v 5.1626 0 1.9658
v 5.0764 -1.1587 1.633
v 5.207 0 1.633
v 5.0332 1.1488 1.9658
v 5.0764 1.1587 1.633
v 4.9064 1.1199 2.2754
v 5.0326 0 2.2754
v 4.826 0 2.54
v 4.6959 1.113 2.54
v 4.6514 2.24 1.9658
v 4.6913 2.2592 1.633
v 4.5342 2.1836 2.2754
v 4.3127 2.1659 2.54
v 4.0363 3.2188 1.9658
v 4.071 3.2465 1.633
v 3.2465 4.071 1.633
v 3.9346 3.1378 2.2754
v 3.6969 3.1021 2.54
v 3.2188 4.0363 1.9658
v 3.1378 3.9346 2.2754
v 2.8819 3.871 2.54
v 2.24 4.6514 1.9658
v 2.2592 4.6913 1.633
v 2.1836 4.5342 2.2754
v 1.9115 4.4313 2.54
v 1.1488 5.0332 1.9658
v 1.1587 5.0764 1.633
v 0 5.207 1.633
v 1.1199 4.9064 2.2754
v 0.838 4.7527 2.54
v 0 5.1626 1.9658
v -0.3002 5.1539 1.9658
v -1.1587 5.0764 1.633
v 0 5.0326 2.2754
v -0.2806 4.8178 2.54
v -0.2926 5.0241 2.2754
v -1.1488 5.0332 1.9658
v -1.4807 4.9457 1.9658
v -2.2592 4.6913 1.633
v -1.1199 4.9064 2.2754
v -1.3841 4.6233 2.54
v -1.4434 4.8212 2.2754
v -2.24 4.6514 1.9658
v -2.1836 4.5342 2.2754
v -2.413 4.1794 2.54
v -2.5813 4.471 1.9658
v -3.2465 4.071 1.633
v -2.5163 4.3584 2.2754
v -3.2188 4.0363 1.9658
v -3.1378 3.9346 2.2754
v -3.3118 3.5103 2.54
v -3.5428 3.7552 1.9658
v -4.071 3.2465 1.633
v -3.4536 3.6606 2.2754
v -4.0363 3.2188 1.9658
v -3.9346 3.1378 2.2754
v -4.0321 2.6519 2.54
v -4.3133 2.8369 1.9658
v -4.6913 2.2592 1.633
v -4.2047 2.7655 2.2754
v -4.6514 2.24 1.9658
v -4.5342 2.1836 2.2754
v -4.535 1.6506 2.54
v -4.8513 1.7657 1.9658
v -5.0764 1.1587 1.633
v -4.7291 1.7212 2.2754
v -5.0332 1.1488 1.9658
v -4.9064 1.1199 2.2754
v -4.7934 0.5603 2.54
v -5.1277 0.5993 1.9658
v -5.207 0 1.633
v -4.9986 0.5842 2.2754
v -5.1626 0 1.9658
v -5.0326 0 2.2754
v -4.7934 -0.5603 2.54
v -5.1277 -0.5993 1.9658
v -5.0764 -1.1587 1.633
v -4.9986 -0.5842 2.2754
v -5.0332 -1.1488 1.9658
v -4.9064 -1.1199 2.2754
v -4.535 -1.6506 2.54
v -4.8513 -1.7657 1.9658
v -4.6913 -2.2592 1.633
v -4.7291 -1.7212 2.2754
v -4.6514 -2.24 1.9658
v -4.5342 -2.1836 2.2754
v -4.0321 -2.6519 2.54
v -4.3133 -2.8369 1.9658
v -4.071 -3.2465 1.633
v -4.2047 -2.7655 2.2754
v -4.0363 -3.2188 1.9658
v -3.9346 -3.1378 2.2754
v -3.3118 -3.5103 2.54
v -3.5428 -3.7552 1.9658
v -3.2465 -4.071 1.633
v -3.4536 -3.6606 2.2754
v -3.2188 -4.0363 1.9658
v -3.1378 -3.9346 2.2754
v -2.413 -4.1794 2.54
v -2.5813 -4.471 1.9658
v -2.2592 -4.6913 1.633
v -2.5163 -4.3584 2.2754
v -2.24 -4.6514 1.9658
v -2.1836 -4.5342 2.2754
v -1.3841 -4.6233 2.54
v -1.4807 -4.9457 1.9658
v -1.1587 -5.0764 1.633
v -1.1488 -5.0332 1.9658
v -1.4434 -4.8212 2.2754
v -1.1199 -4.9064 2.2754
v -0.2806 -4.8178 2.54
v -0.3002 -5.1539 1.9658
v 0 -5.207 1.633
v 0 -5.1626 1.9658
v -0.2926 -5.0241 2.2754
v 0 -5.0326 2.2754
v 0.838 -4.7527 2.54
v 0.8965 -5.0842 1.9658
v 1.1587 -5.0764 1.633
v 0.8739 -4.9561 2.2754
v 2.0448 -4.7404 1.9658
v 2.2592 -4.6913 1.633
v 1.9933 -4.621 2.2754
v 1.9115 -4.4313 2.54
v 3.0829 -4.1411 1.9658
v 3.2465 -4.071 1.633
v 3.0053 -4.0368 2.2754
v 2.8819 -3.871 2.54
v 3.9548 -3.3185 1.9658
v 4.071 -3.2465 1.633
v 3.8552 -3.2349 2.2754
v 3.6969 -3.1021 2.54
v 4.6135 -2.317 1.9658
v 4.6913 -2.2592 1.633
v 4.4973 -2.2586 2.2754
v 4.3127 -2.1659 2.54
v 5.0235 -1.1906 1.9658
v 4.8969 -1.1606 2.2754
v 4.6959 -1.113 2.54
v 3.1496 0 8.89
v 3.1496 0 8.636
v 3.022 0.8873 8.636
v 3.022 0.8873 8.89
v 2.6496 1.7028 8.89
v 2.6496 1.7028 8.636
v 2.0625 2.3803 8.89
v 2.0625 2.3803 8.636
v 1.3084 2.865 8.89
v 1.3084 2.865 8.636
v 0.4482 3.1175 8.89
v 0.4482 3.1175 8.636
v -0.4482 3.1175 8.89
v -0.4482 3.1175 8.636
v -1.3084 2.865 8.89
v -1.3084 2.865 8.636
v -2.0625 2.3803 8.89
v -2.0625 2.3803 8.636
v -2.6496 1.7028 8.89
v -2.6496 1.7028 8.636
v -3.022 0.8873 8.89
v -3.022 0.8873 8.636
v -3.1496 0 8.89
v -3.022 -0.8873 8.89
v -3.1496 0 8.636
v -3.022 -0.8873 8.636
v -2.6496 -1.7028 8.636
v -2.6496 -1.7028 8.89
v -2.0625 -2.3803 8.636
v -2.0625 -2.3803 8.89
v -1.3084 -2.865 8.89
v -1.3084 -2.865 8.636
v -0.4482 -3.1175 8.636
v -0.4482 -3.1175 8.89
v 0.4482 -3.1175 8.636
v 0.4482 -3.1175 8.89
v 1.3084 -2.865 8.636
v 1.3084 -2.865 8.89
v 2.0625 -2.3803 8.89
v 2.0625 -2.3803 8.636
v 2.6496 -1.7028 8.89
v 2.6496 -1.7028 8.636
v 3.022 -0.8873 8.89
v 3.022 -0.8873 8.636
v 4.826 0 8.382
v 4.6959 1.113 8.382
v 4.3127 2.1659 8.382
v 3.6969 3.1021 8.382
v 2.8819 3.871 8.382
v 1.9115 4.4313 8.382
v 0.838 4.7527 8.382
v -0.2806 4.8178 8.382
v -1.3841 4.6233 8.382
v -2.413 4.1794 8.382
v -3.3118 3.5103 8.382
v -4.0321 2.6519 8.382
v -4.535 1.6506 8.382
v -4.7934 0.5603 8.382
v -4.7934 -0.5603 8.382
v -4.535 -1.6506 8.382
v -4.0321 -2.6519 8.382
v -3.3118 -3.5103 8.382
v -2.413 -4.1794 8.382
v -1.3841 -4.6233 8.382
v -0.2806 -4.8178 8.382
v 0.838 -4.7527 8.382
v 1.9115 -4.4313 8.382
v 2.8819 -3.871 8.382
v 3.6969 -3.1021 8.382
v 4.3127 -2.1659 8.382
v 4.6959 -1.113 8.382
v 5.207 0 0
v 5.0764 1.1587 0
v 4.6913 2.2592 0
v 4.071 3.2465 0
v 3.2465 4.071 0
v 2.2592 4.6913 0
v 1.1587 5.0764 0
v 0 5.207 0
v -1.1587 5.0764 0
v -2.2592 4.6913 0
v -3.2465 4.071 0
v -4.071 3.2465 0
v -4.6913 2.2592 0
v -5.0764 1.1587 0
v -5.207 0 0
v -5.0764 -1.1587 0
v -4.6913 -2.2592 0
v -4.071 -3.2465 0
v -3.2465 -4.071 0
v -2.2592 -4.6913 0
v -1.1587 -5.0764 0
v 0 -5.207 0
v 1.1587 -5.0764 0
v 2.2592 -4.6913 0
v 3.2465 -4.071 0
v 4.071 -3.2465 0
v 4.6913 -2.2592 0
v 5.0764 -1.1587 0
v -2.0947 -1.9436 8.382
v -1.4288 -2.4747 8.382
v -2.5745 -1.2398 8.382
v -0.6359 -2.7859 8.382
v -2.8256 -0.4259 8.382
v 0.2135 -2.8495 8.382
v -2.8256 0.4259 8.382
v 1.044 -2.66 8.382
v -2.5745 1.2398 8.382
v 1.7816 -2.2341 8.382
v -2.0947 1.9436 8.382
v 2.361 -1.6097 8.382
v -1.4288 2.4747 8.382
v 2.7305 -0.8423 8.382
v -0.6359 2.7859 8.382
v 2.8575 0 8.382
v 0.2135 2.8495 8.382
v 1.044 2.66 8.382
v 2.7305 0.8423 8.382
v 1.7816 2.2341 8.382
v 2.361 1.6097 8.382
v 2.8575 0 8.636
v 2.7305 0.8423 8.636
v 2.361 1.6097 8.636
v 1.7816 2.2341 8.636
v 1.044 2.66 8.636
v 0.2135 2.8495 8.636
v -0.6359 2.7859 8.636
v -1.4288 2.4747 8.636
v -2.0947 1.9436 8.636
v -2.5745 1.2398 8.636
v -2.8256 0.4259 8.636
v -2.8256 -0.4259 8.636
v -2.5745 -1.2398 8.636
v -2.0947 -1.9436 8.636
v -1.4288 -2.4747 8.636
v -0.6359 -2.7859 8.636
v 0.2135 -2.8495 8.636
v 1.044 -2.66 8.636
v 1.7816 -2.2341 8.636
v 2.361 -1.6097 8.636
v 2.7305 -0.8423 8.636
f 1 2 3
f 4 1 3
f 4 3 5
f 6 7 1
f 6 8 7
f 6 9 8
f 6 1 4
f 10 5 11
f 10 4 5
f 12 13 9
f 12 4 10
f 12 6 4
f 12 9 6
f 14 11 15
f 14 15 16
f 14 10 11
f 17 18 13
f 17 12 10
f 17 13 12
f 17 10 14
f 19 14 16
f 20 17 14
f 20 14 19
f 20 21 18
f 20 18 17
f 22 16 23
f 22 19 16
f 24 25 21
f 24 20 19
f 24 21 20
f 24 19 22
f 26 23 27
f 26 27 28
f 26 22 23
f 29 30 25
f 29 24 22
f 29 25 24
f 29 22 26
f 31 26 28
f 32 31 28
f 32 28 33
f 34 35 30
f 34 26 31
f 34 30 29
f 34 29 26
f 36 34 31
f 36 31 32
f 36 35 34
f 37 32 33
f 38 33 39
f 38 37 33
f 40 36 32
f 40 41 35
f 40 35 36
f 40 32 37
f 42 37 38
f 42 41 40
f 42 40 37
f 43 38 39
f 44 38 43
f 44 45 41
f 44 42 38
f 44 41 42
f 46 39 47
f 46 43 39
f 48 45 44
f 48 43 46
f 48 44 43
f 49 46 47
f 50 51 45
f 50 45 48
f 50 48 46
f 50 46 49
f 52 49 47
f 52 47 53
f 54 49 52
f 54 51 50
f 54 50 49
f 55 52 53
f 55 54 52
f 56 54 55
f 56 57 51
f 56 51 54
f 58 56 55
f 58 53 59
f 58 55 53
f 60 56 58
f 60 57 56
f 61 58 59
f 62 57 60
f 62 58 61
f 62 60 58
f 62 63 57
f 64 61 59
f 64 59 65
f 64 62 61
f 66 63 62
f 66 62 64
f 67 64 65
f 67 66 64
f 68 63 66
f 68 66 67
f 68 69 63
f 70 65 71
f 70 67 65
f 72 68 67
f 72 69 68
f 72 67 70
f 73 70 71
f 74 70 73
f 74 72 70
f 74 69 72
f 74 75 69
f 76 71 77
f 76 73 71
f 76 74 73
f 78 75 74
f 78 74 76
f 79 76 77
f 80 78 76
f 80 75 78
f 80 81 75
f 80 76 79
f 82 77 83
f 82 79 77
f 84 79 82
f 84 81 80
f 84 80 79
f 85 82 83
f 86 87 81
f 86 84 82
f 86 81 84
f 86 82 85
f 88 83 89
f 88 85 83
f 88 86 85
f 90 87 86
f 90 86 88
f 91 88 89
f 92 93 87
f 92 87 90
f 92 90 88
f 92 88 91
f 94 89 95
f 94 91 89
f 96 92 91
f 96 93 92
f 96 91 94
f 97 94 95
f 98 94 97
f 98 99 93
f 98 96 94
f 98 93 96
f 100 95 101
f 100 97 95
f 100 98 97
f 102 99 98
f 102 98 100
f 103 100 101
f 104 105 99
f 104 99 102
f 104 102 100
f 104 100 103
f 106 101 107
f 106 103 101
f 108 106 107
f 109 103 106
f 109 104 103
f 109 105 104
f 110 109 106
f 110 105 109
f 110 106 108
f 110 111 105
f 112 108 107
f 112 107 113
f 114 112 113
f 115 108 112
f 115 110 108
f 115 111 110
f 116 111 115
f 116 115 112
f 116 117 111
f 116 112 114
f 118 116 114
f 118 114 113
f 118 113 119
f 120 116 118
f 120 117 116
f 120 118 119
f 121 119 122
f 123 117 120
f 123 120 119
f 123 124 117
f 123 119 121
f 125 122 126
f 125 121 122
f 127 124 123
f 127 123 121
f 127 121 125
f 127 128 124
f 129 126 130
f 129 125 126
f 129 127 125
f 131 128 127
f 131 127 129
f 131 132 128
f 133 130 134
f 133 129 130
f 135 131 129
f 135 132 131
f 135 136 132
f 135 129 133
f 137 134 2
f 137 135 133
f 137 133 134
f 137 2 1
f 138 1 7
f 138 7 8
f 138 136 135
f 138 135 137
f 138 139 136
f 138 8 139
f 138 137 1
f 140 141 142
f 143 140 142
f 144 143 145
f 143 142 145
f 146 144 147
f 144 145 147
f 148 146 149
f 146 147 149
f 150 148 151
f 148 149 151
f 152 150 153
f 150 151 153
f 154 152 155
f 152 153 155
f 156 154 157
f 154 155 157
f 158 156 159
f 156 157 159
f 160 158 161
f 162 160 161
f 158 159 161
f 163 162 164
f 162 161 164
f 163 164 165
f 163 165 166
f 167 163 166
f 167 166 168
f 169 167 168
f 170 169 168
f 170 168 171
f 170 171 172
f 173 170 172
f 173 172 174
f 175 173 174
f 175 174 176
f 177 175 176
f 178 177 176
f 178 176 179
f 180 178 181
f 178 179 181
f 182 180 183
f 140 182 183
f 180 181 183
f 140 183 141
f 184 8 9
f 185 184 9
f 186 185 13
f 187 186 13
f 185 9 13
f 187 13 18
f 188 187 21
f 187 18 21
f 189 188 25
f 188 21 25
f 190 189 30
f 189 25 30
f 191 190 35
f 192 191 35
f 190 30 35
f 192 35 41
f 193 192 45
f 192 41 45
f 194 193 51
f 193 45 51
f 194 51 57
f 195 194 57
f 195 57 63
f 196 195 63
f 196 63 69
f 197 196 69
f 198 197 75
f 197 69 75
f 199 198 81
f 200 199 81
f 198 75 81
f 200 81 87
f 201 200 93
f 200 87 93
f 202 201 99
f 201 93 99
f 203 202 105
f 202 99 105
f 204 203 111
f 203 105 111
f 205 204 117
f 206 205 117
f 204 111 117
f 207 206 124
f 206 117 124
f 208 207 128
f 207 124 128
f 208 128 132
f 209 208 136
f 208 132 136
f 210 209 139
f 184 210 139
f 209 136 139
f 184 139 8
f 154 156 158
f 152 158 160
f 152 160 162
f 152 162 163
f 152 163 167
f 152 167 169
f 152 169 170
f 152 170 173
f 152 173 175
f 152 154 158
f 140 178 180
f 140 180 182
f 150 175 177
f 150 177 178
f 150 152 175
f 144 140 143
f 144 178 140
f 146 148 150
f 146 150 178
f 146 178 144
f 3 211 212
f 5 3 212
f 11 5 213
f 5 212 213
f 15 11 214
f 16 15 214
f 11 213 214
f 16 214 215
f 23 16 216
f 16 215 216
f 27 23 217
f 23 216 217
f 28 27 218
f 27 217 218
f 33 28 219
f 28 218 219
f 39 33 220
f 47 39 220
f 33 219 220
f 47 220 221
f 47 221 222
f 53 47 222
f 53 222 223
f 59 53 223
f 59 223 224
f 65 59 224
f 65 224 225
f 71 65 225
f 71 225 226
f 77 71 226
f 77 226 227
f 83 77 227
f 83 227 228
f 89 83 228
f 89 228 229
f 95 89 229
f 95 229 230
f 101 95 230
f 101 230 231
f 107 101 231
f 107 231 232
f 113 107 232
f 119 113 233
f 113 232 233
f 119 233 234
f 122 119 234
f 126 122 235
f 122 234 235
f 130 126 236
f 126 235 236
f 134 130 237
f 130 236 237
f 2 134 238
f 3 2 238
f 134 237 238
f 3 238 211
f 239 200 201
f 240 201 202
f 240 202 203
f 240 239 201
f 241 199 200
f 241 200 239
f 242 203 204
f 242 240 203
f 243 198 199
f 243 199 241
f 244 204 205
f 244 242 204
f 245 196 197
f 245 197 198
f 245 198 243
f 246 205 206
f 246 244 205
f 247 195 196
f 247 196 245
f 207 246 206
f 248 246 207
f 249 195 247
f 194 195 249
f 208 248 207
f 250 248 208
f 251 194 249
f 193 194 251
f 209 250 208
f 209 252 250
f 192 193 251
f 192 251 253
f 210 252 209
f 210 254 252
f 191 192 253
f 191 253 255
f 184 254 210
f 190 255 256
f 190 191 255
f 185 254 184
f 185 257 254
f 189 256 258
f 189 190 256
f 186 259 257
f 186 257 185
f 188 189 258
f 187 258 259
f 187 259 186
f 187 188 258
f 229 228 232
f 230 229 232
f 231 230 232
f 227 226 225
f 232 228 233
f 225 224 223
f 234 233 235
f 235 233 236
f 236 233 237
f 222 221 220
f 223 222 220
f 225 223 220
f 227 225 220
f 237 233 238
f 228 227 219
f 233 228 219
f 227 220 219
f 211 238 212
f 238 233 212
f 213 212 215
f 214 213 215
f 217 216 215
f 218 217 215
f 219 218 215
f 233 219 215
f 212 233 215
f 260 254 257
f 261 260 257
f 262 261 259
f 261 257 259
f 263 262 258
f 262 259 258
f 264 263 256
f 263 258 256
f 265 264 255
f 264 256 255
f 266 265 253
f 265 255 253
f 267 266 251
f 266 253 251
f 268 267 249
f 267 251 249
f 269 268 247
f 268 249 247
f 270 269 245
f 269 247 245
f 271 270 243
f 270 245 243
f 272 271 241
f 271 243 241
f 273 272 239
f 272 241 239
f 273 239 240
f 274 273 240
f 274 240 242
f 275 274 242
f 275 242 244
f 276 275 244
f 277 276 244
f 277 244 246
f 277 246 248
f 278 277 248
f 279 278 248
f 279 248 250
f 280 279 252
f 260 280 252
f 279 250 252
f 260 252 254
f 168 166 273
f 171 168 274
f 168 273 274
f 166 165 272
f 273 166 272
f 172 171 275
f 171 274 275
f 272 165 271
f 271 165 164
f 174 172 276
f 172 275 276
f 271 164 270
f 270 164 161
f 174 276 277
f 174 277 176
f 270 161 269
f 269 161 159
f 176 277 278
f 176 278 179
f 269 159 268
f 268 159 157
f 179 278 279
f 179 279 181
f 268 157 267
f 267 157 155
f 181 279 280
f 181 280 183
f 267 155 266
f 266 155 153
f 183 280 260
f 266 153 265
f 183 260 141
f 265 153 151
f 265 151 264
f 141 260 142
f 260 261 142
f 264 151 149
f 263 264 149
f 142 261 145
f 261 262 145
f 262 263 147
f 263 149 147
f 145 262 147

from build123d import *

# Parameters (mm, degrees)
F0_R     = 5.207
F1_DEPTH = 2.54
F2_R     = 4.826
F3_DEPTH = 5.842
F5_R     = 2.8575
F6_DEPTH = 0.254
F7_R     = 3.1496
F8_DEPTH = 0.254


# Not quite as in the source:
# - a fillet or chamfer that OpenCascade refuses, or shapes differently, is made with other operations: its cross-section is extruded or revolved along the edge and cut away or added


with BuildPart() as f1:
    # F0 (on Top) → F1 (new body)
    with BuildSketch(Plane.XY):
        Circle(F0_R)
    extrude(amount=F1_DEPTH)

    # F2 (on face) → F3 (join)
    with BuildSketch(Plane.XY.offset(2.54)):
        Circle(F2_R)
    extrude(amount=F3_DEPTH)

    # F4: fillet of radius 1.27 on 1 edges, made by hand

    # F4_s1 → F4_t2 (revolve, cut)
    with BuildSketch(Plane.XZ):
        with BuildLine():
            ThreePointArc((5.207, 1.6330385896), (5.1078821461, 2.1249074745), (4.826, 2.54))
            Line((4.826, 2.54), (5.207, 2.54))
            Line((5.207, 2.54), (5.207, 1.6330385896))
        make_face()
    revolve(axis=Axis((0, 0, 2.54), (0, 0, 1)), mode=Mode.SUBTRACT)

    # F5 (on face) → F6 (join)
    with BuildSketch(Plane.XY.offset(8.382)):
        Circle(F5_R)
    extrude(amount=F6_DEPTH)

    # F7 (on face) → F8 (join)
    with BuildSketch(Plane.XY.offset(8.636)):
        Circle(F7_R)
    extrude(amount=F8_DEPTH)


solid = f1.part
